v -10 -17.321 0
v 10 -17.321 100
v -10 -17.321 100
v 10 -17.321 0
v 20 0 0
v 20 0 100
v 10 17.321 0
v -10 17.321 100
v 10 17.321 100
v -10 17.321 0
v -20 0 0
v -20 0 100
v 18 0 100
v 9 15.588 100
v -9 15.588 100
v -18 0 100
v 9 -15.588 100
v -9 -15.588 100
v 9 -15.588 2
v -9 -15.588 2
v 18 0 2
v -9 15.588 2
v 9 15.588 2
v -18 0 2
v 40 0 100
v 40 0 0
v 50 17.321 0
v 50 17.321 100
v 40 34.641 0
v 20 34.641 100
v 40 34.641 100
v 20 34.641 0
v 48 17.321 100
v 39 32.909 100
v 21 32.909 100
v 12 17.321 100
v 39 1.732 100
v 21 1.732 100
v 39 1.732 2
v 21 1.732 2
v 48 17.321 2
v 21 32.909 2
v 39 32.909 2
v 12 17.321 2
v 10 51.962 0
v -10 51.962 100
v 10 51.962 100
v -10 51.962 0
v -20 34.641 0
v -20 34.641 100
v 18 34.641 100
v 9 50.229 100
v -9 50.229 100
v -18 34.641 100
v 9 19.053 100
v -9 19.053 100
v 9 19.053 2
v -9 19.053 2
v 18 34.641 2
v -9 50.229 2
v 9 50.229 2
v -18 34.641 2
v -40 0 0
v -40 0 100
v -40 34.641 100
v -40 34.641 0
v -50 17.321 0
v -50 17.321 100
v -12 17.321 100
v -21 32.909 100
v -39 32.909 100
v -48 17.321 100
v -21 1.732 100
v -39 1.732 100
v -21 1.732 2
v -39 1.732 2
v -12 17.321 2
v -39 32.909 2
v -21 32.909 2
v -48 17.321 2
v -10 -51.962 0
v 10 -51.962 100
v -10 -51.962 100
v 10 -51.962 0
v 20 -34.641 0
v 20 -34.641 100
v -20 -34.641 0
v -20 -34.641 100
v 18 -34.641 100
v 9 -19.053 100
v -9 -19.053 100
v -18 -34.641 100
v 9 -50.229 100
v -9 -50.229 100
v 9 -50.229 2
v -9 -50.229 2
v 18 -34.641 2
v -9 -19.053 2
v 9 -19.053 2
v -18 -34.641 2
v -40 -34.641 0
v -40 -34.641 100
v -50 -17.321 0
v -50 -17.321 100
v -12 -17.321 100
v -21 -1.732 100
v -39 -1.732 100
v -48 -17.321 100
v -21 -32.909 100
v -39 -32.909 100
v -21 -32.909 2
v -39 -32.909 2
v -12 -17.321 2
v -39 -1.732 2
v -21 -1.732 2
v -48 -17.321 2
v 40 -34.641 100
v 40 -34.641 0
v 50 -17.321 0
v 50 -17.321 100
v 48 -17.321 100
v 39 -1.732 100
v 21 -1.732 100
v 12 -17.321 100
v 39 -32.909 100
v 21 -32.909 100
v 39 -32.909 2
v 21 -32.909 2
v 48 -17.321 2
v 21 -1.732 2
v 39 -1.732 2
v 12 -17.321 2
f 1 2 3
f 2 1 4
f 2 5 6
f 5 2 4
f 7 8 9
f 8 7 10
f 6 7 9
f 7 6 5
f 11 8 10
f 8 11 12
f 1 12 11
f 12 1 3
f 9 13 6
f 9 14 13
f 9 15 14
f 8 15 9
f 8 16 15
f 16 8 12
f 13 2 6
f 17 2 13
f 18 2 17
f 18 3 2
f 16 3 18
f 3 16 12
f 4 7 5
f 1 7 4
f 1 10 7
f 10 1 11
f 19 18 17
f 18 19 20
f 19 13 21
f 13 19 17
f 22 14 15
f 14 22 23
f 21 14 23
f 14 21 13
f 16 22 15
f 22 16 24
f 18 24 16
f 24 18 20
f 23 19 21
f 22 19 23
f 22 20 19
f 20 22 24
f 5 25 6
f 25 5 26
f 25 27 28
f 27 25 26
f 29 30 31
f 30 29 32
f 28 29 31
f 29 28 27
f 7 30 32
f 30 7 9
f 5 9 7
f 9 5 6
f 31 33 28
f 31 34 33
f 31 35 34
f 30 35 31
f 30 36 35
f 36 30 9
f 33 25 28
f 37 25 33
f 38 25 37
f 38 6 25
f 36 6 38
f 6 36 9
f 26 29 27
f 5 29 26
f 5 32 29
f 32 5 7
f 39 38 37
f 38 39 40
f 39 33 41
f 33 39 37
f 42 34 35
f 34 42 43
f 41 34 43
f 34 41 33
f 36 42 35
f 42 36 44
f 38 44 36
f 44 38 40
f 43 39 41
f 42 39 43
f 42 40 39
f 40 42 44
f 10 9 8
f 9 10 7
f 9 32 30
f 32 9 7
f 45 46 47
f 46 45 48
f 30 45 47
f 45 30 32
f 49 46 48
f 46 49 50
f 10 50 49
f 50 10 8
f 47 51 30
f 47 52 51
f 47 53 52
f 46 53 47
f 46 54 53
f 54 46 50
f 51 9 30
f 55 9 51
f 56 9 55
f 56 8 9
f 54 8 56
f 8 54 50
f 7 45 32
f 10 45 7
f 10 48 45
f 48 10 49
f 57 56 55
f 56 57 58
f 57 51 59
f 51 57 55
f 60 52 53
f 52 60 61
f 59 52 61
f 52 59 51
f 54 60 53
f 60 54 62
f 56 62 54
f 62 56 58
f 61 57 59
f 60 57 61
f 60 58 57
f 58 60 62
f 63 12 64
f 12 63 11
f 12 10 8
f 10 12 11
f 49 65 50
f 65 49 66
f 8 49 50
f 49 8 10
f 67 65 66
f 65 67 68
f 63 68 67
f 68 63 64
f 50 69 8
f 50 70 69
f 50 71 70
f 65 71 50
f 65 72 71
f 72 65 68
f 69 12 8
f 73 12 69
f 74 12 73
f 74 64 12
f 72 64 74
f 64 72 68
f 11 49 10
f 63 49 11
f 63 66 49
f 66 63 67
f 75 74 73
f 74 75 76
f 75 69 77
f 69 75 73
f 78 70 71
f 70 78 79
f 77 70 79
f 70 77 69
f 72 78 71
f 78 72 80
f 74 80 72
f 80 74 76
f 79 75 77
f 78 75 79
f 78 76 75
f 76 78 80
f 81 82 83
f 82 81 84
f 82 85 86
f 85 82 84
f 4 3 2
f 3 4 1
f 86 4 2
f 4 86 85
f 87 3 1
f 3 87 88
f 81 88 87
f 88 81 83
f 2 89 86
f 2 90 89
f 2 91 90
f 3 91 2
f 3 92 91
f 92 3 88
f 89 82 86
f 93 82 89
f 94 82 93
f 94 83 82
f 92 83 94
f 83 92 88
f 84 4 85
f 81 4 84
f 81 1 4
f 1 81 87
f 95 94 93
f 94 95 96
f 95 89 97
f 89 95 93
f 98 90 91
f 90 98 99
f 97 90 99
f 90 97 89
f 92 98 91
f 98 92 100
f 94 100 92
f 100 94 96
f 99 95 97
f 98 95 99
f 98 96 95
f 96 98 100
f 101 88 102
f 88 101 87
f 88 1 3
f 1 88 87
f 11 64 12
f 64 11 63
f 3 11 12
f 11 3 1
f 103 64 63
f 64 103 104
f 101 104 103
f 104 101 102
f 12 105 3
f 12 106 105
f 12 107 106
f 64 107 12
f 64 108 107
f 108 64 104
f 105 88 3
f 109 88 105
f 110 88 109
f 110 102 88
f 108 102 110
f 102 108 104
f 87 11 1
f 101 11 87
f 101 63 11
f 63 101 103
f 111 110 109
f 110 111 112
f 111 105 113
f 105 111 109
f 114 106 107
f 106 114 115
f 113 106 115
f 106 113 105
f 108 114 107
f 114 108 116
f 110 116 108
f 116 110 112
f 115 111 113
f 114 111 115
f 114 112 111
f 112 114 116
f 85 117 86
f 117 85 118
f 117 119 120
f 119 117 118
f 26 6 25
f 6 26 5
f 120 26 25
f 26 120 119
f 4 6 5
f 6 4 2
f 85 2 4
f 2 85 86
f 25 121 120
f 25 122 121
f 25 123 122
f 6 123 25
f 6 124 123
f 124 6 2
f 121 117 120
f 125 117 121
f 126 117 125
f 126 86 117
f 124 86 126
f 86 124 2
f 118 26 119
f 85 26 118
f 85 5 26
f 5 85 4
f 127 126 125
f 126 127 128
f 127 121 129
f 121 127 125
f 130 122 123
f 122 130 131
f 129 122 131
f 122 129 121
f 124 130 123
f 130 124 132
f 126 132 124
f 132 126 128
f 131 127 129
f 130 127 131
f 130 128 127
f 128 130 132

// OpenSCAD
//radius of hex
radius = 20 ;

//shell thickness
shell_thickness =2 ;

//height of central hex
central_hex_height = 100 ;

//height of North East hex
NE_hex_height = 100 ;

//height of North hex
N_hex_height = 100 ;

//height of North West hex
NW_hex_height = 100 ;

//height of South West hex
SW_hex_height = 100 ;

//height of South hex
S_hex_height = 100 ;

//height of South East hex
SE_hex_height = 100 ;



module pot_hexa(h,r,shell) {
    difference (){
        cylinder(h,r,r,$fn=6);  
        translate([0,0,shell])
        cylinder(h,r-shell,r-shell,$fn=6);
    }
};



module marguerite(h,r,shell,face1,face2,face3,face4,face5,face6) {

//centre    
    pot_hexa(h,r,2) ;

if (face1>0) {
    translate([3/2*r,r*sqrt(3)/2,0])
    pot_hexa(face1,r,shell) ;
}

if (face2>0) {
    translate([00,sqrt(3)*r,0])
    pot_hexa(face2,r,shell) ;
}
if (face3>0) {
    translate([-3/2*r,r*sqrt(3)/2,0])
    pot_hexa(face3,r,shell) ;
}

if (face4>0) {
    translate([00,-sqrt(3)*r,0])
    pot_hexa(face4,r,shell) ;
}
if (face5>0) {
    translate([-3/2*r,-r*sqrt(3)/2,0])
    pot_hexa(face5,r,shell) ;
}

if (face6>0) {
    translate([3/2*r,-r*sqrt(3)/2,0])
    pot_hexa(face6,r,shell) ;
}
    }


marguerite(central_hex_height,radius,shell_thickness,NE_hex_height,N_hex_height,NW_hex_height,SW_hex_height,S_hex_height,SE_hex_height) ;
